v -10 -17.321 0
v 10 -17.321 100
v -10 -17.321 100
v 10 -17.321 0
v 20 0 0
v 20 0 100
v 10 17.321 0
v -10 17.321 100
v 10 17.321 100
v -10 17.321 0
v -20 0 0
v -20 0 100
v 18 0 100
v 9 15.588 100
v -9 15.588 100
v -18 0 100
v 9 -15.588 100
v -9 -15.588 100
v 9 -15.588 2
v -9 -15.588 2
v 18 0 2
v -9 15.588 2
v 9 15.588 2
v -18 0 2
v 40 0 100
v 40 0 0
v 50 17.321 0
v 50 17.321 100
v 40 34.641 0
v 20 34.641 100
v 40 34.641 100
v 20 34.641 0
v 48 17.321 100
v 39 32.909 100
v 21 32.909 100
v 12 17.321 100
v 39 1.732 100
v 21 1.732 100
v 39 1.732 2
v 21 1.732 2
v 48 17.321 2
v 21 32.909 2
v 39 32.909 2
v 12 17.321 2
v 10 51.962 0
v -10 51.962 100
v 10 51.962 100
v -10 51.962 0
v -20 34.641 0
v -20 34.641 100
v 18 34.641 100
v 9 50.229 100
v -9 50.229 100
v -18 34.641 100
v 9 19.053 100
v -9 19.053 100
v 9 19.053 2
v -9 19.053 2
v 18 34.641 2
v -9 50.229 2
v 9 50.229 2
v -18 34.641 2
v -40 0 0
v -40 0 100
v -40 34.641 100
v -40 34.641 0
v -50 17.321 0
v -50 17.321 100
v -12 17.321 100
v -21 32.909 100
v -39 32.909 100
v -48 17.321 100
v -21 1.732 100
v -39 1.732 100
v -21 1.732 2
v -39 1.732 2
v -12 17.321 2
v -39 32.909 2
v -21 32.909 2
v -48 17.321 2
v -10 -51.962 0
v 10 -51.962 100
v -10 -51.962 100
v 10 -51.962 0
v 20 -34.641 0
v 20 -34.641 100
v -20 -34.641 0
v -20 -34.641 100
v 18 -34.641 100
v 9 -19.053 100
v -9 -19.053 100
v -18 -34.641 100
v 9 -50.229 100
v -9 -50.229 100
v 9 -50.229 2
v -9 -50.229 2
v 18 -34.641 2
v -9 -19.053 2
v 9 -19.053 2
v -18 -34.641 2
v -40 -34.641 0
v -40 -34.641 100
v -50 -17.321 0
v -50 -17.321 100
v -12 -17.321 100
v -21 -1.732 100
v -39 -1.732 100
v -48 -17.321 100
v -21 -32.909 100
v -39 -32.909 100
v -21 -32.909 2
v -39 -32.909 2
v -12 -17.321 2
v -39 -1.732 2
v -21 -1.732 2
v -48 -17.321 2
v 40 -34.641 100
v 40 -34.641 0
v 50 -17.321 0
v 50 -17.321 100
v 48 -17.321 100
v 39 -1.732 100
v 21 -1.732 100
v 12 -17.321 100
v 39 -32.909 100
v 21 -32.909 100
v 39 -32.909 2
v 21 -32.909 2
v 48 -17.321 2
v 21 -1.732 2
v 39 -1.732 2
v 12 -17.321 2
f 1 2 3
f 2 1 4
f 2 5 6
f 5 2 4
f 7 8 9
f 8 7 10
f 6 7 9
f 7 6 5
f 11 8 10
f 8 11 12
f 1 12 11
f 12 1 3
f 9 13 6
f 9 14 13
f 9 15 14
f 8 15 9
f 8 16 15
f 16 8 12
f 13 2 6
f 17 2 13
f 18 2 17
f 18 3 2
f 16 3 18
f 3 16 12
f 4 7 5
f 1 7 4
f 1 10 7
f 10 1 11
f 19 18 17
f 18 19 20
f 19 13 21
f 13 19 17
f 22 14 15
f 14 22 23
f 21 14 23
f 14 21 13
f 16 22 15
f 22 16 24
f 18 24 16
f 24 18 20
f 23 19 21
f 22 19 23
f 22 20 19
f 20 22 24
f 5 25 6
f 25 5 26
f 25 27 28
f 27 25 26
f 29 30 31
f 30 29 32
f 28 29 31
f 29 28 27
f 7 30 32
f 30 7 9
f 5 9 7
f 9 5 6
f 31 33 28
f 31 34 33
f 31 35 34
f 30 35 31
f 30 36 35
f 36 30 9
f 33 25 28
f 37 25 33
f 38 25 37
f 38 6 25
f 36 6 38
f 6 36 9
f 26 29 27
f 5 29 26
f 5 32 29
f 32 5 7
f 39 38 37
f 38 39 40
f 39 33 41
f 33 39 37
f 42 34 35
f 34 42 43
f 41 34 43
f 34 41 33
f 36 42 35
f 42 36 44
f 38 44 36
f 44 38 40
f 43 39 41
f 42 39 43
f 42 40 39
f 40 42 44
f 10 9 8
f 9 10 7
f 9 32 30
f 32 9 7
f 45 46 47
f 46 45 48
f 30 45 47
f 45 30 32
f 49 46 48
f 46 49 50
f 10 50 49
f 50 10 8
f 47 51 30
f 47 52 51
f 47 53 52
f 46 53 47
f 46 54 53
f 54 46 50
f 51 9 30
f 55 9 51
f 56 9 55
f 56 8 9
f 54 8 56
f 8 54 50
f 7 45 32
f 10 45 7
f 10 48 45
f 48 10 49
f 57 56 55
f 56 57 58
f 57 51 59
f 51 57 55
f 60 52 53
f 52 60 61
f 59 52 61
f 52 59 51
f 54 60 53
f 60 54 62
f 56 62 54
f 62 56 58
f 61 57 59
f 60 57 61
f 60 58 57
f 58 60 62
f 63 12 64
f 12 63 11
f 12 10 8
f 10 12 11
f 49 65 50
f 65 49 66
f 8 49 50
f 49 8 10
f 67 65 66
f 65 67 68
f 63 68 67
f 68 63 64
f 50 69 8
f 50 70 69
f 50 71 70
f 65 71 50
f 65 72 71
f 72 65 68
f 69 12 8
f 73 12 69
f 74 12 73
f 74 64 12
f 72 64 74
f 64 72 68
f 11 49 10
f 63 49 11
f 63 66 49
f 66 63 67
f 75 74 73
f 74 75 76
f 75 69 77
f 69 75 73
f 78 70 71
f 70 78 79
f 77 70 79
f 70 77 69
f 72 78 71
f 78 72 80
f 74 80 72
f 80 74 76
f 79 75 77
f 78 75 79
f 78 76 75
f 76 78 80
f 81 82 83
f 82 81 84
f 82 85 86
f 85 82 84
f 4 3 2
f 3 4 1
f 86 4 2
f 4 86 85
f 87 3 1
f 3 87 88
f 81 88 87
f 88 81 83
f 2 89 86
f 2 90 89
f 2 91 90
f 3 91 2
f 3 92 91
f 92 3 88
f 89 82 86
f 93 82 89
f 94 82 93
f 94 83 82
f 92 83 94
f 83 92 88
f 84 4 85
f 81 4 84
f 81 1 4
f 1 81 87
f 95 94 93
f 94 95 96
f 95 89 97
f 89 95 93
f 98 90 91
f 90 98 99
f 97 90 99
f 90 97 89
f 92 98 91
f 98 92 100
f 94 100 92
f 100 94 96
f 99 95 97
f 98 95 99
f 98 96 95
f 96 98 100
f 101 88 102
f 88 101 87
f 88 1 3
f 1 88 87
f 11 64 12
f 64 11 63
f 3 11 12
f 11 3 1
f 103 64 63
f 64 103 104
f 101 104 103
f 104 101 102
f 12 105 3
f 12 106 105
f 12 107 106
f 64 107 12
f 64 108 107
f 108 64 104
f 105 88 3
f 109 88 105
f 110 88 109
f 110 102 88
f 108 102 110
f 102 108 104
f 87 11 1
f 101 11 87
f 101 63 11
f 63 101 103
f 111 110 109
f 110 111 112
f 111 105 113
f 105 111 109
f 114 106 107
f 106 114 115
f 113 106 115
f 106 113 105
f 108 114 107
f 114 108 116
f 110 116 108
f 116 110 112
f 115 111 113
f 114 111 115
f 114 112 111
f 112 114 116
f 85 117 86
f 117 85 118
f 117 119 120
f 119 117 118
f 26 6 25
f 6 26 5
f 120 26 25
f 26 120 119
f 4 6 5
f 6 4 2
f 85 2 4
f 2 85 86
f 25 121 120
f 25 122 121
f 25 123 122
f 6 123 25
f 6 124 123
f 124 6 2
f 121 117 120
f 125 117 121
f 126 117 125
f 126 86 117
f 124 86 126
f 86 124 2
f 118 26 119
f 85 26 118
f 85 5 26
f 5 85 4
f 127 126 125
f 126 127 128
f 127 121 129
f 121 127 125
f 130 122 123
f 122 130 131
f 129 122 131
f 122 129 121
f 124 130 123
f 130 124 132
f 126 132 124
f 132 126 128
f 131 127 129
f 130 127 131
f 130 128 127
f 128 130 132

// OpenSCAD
//radius of hex
radius = 20 ;

//shell thickness
shell_thickness =2 ;

//height of central hex
central_hex_height = 100 ;

//height of North East hex
NE_hex_height = 100 ;

//height of North hex
N_hex_height = 100 ;

//height of North West hex
NW_hex_height = 100 ;

//height of South West hex
SW_hex_height = 100 ;

//height of South hex
S_hex_height = 100 ;

//height of South East hex
SE_hex_height = 100 ;



module pot_hexa(h,r,shell) {
    difference (){
        cylinder(h,r,r,$fn=6);  
        translate([0,0,shell])
        cylinder(h,r-shell,r-shell,$fn=6);
    }
};



module marguerite(h,r,shell,face1,face2,face3,face4,face5,face6) {

//centre    
    pot_hexa(h,r,2) ;

if (face1>0) {
    translate([3/2*r,r*sqrt(3)/2,0])
    pot_hexa(face1,r,shell) ;
}

if (face2>0) {
    translate([00,sqrt(3)*r,0])
    pot_hexa(face2,r,shell) ;
}
if (face3>0) {
    translate([-3/2*r,r*sqrt(3)/2,0])
    pot_hexa(face3,r,shell) ;
}

if (face4>0) {
    translate([00,-sqrt(3)*r,0])
    pot_hexa(face4,r,shell) ;
}
if (face5>0) {
    translate([-3/2*r,-r*sqrt(3)/2,0])
    pot_hexa(face5,r,shell) ;
}

if (face6>0) {
    translate([3/2*r,-r*sqrt(3)/2,0])
    pot_hexa(face6,r,shell) ;
}
    }


marguerite(central_hex_height,radius,shell_thickness,NE_hex_height,N_hex_height,NW_hex_height,SW_hex_height,S_hex_height,SE_hex_height) ;
